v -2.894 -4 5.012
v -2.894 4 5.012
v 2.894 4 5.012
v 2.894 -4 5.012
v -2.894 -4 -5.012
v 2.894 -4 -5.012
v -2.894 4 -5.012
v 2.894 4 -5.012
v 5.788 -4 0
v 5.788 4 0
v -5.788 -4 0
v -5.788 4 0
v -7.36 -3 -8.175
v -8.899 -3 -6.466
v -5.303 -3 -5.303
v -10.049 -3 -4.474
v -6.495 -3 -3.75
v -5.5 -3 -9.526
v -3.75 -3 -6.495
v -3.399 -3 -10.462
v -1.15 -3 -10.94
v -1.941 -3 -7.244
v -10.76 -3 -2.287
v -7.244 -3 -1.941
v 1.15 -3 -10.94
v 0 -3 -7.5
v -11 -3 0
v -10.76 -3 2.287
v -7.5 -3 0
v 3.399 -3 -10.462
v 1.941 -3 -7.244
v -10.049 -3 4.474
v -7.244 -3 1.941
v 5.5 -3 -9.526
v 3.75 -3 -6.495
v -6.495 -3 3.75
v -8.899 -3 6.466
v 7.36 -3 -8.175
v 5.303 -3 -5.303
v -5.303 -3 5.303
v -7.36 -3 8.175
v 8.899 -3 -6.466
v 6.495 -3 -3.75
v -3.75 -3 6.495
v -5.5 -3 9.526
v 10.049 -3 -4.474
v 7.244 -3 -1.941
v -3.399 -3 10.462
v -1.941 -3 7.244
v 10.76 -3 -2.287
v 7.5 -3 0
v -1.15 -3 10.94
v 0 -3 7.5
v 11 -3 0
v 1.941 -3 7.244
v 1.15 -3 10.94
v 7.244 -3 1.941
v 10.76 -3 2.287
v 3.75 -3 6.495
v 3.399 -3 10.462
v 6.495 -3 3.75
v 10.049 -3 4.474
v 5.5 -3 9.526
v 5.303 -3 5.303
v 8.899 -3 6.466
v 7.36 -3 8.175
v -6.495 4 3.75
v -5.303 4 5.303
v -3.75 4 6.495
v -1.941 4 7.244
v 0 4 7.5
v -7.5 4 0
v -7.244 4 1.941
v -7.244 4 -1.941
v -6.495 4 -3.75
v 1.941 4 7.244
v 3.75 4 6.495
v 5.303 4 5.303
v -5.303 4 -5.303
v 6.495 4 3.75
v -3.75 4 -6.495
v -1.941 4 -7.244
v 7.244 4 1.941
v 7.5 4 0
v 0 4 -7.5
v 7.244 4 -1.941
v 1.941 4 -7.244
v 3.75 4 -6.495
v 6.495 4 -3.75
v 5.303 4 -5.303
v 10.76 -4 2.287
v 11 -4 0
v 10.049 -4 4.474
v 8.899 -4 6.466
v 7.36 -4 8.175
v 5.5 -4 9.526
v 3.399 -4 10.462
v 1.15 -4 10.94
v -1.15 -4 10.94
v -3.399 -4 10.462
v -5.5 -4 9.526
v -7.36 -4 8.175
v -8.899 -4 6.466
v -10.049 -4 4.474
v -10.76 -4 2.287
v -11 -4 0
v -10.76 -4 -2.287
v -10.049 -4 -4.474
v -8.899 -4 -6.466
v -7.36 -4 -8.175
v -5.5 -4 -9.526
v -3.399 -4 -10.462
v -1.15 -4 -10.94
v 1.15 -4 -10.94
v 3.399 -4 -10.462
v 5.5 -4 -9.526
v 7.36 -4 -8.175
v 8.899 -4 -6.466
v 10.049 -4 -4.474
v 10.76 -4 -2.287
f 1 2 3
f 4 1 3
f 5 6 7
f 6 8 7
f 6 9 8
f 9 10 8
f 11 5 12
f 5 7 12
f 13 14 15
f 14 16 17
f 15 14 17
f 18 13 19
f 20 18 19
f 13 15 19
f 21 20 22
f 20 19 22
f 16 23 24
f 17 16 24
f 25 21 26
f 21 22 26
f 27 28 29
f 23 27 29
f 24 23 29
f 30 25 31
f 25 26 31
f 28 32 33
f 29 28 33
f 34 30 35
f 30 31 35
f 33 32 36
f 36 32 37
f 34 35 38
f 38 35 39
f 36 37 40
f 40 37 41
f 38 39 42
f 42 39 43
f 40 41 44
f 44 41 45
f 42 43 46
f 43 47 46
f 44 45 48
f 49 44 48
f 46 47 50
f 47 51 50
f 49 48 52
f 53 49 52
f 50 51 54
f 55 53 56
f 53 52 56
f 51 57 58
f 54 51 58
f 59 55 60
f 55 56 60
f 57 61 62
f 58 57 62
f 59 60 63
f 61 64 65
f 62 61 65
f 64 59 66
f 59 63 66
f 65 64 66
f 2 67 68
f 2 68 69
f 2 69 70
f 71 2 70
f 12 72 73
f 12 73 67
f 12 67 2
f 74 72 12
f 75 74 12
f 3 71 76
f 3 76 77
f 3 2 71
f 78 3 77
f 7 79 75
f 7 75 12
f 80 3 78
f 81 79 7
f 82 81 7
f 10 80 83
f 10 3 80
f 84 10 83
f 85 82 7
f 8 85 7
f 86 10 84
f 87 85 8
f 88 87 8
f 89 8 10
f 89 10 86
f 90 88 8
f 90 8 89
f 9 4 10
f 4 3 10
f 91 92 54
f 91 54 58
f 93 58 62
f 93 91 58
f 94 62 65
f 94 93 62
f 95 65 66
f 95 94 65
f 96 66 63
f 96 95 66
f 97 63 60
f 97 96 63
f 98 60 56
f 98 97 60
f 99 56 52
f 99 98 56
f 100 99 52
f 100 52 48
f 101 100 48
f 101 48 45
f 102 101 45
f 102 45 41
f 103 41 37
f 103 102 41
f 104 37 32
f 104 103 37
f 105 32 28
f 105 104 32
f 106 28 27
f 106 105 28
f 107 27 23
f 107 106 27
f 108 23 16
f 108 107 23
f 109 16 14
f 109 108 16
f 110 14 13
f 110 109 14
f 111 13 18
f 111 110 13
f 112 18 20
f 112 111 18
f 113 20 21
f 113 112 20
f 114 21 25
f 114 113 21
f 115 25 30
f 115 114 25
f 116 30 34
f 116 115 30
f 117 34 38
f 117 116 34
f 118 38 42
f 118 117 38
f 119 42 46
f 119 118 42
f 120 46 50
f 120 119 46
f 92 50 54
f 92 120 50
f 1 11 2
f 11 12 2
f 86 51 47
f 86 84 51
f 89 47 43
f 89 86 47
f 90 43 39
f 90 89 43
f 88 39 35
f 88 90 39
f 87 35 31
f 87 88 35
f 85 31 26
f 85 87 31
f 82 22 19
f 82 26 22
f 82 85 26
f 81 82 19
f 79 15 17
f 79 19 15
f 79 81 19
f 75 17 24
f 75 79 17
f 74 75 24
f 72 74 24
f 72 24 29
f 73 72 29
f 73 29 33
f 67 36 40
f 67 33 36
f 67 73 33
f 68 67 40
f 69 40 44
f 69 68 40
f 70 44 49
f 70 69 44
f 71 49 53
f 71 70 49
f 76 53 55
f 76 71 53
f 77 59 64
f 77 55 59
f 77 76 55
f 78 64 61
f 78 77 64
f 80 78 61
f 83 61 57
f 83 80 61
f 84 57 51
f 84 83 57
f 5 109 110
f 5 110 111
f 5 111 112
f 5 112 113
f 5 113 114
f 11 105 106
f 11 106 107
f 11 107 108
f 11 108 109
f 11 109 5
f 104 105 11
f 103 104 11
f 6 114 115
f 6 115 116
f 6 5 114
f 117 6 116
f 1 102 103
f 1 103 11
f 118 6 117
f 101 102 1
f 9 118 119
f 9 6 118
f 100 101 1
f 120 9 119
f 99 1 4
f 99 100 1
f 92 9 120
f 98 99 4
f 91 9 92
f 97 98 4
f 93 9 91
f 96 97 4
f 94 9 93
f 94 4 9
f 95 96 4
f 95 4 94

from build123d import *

# Parameters (mm, degrees)
SKETCH1_R           = 7.5
BOSS_EXTRUDE1_DEPTH = 4
BOSS_EXTRUDE2_START = -1
SKETCH2_R           = 11
SKETCH2_R_2         = 7.5
BOSS_EXTRUDE2_DEPTH = 1


with BuildPart() as part:
    # Sketch1 → Boss-Extrude1 (new, symmetric)
    with BuildSketch(Plane(origin=(0, 0, 0), x_dir=(1, 0, 0), z_dir=(0, 1, 0))):
        Circle(SKETCH1_R)
        Polygon((-2.893968224, -5.0125), (2.893968224, -5.0125), (5.787936449, 0), (2.893968224, 5.0125), (-2.893968224, 5.0125), (-5.787936449, 0), align=None, mode=Mode.SUBTRACT)
    extrude(amount=BOSS_EXTRUDE1_DEPTH, both=True)

    # Sketch2 → Boss-Extrude2 (add)
    with BuildSketch(Plane.XZ.offset(4).offset(BOSS_EXTRUDE2_START)):
        Circle(SKETCH2_R)
        Circle(SKETCH2_R_2, mode=Mode.SUBTRACT)
    extrude(amount=BOSS_EXTRUDE2_DEPTH)


solid = part.part
